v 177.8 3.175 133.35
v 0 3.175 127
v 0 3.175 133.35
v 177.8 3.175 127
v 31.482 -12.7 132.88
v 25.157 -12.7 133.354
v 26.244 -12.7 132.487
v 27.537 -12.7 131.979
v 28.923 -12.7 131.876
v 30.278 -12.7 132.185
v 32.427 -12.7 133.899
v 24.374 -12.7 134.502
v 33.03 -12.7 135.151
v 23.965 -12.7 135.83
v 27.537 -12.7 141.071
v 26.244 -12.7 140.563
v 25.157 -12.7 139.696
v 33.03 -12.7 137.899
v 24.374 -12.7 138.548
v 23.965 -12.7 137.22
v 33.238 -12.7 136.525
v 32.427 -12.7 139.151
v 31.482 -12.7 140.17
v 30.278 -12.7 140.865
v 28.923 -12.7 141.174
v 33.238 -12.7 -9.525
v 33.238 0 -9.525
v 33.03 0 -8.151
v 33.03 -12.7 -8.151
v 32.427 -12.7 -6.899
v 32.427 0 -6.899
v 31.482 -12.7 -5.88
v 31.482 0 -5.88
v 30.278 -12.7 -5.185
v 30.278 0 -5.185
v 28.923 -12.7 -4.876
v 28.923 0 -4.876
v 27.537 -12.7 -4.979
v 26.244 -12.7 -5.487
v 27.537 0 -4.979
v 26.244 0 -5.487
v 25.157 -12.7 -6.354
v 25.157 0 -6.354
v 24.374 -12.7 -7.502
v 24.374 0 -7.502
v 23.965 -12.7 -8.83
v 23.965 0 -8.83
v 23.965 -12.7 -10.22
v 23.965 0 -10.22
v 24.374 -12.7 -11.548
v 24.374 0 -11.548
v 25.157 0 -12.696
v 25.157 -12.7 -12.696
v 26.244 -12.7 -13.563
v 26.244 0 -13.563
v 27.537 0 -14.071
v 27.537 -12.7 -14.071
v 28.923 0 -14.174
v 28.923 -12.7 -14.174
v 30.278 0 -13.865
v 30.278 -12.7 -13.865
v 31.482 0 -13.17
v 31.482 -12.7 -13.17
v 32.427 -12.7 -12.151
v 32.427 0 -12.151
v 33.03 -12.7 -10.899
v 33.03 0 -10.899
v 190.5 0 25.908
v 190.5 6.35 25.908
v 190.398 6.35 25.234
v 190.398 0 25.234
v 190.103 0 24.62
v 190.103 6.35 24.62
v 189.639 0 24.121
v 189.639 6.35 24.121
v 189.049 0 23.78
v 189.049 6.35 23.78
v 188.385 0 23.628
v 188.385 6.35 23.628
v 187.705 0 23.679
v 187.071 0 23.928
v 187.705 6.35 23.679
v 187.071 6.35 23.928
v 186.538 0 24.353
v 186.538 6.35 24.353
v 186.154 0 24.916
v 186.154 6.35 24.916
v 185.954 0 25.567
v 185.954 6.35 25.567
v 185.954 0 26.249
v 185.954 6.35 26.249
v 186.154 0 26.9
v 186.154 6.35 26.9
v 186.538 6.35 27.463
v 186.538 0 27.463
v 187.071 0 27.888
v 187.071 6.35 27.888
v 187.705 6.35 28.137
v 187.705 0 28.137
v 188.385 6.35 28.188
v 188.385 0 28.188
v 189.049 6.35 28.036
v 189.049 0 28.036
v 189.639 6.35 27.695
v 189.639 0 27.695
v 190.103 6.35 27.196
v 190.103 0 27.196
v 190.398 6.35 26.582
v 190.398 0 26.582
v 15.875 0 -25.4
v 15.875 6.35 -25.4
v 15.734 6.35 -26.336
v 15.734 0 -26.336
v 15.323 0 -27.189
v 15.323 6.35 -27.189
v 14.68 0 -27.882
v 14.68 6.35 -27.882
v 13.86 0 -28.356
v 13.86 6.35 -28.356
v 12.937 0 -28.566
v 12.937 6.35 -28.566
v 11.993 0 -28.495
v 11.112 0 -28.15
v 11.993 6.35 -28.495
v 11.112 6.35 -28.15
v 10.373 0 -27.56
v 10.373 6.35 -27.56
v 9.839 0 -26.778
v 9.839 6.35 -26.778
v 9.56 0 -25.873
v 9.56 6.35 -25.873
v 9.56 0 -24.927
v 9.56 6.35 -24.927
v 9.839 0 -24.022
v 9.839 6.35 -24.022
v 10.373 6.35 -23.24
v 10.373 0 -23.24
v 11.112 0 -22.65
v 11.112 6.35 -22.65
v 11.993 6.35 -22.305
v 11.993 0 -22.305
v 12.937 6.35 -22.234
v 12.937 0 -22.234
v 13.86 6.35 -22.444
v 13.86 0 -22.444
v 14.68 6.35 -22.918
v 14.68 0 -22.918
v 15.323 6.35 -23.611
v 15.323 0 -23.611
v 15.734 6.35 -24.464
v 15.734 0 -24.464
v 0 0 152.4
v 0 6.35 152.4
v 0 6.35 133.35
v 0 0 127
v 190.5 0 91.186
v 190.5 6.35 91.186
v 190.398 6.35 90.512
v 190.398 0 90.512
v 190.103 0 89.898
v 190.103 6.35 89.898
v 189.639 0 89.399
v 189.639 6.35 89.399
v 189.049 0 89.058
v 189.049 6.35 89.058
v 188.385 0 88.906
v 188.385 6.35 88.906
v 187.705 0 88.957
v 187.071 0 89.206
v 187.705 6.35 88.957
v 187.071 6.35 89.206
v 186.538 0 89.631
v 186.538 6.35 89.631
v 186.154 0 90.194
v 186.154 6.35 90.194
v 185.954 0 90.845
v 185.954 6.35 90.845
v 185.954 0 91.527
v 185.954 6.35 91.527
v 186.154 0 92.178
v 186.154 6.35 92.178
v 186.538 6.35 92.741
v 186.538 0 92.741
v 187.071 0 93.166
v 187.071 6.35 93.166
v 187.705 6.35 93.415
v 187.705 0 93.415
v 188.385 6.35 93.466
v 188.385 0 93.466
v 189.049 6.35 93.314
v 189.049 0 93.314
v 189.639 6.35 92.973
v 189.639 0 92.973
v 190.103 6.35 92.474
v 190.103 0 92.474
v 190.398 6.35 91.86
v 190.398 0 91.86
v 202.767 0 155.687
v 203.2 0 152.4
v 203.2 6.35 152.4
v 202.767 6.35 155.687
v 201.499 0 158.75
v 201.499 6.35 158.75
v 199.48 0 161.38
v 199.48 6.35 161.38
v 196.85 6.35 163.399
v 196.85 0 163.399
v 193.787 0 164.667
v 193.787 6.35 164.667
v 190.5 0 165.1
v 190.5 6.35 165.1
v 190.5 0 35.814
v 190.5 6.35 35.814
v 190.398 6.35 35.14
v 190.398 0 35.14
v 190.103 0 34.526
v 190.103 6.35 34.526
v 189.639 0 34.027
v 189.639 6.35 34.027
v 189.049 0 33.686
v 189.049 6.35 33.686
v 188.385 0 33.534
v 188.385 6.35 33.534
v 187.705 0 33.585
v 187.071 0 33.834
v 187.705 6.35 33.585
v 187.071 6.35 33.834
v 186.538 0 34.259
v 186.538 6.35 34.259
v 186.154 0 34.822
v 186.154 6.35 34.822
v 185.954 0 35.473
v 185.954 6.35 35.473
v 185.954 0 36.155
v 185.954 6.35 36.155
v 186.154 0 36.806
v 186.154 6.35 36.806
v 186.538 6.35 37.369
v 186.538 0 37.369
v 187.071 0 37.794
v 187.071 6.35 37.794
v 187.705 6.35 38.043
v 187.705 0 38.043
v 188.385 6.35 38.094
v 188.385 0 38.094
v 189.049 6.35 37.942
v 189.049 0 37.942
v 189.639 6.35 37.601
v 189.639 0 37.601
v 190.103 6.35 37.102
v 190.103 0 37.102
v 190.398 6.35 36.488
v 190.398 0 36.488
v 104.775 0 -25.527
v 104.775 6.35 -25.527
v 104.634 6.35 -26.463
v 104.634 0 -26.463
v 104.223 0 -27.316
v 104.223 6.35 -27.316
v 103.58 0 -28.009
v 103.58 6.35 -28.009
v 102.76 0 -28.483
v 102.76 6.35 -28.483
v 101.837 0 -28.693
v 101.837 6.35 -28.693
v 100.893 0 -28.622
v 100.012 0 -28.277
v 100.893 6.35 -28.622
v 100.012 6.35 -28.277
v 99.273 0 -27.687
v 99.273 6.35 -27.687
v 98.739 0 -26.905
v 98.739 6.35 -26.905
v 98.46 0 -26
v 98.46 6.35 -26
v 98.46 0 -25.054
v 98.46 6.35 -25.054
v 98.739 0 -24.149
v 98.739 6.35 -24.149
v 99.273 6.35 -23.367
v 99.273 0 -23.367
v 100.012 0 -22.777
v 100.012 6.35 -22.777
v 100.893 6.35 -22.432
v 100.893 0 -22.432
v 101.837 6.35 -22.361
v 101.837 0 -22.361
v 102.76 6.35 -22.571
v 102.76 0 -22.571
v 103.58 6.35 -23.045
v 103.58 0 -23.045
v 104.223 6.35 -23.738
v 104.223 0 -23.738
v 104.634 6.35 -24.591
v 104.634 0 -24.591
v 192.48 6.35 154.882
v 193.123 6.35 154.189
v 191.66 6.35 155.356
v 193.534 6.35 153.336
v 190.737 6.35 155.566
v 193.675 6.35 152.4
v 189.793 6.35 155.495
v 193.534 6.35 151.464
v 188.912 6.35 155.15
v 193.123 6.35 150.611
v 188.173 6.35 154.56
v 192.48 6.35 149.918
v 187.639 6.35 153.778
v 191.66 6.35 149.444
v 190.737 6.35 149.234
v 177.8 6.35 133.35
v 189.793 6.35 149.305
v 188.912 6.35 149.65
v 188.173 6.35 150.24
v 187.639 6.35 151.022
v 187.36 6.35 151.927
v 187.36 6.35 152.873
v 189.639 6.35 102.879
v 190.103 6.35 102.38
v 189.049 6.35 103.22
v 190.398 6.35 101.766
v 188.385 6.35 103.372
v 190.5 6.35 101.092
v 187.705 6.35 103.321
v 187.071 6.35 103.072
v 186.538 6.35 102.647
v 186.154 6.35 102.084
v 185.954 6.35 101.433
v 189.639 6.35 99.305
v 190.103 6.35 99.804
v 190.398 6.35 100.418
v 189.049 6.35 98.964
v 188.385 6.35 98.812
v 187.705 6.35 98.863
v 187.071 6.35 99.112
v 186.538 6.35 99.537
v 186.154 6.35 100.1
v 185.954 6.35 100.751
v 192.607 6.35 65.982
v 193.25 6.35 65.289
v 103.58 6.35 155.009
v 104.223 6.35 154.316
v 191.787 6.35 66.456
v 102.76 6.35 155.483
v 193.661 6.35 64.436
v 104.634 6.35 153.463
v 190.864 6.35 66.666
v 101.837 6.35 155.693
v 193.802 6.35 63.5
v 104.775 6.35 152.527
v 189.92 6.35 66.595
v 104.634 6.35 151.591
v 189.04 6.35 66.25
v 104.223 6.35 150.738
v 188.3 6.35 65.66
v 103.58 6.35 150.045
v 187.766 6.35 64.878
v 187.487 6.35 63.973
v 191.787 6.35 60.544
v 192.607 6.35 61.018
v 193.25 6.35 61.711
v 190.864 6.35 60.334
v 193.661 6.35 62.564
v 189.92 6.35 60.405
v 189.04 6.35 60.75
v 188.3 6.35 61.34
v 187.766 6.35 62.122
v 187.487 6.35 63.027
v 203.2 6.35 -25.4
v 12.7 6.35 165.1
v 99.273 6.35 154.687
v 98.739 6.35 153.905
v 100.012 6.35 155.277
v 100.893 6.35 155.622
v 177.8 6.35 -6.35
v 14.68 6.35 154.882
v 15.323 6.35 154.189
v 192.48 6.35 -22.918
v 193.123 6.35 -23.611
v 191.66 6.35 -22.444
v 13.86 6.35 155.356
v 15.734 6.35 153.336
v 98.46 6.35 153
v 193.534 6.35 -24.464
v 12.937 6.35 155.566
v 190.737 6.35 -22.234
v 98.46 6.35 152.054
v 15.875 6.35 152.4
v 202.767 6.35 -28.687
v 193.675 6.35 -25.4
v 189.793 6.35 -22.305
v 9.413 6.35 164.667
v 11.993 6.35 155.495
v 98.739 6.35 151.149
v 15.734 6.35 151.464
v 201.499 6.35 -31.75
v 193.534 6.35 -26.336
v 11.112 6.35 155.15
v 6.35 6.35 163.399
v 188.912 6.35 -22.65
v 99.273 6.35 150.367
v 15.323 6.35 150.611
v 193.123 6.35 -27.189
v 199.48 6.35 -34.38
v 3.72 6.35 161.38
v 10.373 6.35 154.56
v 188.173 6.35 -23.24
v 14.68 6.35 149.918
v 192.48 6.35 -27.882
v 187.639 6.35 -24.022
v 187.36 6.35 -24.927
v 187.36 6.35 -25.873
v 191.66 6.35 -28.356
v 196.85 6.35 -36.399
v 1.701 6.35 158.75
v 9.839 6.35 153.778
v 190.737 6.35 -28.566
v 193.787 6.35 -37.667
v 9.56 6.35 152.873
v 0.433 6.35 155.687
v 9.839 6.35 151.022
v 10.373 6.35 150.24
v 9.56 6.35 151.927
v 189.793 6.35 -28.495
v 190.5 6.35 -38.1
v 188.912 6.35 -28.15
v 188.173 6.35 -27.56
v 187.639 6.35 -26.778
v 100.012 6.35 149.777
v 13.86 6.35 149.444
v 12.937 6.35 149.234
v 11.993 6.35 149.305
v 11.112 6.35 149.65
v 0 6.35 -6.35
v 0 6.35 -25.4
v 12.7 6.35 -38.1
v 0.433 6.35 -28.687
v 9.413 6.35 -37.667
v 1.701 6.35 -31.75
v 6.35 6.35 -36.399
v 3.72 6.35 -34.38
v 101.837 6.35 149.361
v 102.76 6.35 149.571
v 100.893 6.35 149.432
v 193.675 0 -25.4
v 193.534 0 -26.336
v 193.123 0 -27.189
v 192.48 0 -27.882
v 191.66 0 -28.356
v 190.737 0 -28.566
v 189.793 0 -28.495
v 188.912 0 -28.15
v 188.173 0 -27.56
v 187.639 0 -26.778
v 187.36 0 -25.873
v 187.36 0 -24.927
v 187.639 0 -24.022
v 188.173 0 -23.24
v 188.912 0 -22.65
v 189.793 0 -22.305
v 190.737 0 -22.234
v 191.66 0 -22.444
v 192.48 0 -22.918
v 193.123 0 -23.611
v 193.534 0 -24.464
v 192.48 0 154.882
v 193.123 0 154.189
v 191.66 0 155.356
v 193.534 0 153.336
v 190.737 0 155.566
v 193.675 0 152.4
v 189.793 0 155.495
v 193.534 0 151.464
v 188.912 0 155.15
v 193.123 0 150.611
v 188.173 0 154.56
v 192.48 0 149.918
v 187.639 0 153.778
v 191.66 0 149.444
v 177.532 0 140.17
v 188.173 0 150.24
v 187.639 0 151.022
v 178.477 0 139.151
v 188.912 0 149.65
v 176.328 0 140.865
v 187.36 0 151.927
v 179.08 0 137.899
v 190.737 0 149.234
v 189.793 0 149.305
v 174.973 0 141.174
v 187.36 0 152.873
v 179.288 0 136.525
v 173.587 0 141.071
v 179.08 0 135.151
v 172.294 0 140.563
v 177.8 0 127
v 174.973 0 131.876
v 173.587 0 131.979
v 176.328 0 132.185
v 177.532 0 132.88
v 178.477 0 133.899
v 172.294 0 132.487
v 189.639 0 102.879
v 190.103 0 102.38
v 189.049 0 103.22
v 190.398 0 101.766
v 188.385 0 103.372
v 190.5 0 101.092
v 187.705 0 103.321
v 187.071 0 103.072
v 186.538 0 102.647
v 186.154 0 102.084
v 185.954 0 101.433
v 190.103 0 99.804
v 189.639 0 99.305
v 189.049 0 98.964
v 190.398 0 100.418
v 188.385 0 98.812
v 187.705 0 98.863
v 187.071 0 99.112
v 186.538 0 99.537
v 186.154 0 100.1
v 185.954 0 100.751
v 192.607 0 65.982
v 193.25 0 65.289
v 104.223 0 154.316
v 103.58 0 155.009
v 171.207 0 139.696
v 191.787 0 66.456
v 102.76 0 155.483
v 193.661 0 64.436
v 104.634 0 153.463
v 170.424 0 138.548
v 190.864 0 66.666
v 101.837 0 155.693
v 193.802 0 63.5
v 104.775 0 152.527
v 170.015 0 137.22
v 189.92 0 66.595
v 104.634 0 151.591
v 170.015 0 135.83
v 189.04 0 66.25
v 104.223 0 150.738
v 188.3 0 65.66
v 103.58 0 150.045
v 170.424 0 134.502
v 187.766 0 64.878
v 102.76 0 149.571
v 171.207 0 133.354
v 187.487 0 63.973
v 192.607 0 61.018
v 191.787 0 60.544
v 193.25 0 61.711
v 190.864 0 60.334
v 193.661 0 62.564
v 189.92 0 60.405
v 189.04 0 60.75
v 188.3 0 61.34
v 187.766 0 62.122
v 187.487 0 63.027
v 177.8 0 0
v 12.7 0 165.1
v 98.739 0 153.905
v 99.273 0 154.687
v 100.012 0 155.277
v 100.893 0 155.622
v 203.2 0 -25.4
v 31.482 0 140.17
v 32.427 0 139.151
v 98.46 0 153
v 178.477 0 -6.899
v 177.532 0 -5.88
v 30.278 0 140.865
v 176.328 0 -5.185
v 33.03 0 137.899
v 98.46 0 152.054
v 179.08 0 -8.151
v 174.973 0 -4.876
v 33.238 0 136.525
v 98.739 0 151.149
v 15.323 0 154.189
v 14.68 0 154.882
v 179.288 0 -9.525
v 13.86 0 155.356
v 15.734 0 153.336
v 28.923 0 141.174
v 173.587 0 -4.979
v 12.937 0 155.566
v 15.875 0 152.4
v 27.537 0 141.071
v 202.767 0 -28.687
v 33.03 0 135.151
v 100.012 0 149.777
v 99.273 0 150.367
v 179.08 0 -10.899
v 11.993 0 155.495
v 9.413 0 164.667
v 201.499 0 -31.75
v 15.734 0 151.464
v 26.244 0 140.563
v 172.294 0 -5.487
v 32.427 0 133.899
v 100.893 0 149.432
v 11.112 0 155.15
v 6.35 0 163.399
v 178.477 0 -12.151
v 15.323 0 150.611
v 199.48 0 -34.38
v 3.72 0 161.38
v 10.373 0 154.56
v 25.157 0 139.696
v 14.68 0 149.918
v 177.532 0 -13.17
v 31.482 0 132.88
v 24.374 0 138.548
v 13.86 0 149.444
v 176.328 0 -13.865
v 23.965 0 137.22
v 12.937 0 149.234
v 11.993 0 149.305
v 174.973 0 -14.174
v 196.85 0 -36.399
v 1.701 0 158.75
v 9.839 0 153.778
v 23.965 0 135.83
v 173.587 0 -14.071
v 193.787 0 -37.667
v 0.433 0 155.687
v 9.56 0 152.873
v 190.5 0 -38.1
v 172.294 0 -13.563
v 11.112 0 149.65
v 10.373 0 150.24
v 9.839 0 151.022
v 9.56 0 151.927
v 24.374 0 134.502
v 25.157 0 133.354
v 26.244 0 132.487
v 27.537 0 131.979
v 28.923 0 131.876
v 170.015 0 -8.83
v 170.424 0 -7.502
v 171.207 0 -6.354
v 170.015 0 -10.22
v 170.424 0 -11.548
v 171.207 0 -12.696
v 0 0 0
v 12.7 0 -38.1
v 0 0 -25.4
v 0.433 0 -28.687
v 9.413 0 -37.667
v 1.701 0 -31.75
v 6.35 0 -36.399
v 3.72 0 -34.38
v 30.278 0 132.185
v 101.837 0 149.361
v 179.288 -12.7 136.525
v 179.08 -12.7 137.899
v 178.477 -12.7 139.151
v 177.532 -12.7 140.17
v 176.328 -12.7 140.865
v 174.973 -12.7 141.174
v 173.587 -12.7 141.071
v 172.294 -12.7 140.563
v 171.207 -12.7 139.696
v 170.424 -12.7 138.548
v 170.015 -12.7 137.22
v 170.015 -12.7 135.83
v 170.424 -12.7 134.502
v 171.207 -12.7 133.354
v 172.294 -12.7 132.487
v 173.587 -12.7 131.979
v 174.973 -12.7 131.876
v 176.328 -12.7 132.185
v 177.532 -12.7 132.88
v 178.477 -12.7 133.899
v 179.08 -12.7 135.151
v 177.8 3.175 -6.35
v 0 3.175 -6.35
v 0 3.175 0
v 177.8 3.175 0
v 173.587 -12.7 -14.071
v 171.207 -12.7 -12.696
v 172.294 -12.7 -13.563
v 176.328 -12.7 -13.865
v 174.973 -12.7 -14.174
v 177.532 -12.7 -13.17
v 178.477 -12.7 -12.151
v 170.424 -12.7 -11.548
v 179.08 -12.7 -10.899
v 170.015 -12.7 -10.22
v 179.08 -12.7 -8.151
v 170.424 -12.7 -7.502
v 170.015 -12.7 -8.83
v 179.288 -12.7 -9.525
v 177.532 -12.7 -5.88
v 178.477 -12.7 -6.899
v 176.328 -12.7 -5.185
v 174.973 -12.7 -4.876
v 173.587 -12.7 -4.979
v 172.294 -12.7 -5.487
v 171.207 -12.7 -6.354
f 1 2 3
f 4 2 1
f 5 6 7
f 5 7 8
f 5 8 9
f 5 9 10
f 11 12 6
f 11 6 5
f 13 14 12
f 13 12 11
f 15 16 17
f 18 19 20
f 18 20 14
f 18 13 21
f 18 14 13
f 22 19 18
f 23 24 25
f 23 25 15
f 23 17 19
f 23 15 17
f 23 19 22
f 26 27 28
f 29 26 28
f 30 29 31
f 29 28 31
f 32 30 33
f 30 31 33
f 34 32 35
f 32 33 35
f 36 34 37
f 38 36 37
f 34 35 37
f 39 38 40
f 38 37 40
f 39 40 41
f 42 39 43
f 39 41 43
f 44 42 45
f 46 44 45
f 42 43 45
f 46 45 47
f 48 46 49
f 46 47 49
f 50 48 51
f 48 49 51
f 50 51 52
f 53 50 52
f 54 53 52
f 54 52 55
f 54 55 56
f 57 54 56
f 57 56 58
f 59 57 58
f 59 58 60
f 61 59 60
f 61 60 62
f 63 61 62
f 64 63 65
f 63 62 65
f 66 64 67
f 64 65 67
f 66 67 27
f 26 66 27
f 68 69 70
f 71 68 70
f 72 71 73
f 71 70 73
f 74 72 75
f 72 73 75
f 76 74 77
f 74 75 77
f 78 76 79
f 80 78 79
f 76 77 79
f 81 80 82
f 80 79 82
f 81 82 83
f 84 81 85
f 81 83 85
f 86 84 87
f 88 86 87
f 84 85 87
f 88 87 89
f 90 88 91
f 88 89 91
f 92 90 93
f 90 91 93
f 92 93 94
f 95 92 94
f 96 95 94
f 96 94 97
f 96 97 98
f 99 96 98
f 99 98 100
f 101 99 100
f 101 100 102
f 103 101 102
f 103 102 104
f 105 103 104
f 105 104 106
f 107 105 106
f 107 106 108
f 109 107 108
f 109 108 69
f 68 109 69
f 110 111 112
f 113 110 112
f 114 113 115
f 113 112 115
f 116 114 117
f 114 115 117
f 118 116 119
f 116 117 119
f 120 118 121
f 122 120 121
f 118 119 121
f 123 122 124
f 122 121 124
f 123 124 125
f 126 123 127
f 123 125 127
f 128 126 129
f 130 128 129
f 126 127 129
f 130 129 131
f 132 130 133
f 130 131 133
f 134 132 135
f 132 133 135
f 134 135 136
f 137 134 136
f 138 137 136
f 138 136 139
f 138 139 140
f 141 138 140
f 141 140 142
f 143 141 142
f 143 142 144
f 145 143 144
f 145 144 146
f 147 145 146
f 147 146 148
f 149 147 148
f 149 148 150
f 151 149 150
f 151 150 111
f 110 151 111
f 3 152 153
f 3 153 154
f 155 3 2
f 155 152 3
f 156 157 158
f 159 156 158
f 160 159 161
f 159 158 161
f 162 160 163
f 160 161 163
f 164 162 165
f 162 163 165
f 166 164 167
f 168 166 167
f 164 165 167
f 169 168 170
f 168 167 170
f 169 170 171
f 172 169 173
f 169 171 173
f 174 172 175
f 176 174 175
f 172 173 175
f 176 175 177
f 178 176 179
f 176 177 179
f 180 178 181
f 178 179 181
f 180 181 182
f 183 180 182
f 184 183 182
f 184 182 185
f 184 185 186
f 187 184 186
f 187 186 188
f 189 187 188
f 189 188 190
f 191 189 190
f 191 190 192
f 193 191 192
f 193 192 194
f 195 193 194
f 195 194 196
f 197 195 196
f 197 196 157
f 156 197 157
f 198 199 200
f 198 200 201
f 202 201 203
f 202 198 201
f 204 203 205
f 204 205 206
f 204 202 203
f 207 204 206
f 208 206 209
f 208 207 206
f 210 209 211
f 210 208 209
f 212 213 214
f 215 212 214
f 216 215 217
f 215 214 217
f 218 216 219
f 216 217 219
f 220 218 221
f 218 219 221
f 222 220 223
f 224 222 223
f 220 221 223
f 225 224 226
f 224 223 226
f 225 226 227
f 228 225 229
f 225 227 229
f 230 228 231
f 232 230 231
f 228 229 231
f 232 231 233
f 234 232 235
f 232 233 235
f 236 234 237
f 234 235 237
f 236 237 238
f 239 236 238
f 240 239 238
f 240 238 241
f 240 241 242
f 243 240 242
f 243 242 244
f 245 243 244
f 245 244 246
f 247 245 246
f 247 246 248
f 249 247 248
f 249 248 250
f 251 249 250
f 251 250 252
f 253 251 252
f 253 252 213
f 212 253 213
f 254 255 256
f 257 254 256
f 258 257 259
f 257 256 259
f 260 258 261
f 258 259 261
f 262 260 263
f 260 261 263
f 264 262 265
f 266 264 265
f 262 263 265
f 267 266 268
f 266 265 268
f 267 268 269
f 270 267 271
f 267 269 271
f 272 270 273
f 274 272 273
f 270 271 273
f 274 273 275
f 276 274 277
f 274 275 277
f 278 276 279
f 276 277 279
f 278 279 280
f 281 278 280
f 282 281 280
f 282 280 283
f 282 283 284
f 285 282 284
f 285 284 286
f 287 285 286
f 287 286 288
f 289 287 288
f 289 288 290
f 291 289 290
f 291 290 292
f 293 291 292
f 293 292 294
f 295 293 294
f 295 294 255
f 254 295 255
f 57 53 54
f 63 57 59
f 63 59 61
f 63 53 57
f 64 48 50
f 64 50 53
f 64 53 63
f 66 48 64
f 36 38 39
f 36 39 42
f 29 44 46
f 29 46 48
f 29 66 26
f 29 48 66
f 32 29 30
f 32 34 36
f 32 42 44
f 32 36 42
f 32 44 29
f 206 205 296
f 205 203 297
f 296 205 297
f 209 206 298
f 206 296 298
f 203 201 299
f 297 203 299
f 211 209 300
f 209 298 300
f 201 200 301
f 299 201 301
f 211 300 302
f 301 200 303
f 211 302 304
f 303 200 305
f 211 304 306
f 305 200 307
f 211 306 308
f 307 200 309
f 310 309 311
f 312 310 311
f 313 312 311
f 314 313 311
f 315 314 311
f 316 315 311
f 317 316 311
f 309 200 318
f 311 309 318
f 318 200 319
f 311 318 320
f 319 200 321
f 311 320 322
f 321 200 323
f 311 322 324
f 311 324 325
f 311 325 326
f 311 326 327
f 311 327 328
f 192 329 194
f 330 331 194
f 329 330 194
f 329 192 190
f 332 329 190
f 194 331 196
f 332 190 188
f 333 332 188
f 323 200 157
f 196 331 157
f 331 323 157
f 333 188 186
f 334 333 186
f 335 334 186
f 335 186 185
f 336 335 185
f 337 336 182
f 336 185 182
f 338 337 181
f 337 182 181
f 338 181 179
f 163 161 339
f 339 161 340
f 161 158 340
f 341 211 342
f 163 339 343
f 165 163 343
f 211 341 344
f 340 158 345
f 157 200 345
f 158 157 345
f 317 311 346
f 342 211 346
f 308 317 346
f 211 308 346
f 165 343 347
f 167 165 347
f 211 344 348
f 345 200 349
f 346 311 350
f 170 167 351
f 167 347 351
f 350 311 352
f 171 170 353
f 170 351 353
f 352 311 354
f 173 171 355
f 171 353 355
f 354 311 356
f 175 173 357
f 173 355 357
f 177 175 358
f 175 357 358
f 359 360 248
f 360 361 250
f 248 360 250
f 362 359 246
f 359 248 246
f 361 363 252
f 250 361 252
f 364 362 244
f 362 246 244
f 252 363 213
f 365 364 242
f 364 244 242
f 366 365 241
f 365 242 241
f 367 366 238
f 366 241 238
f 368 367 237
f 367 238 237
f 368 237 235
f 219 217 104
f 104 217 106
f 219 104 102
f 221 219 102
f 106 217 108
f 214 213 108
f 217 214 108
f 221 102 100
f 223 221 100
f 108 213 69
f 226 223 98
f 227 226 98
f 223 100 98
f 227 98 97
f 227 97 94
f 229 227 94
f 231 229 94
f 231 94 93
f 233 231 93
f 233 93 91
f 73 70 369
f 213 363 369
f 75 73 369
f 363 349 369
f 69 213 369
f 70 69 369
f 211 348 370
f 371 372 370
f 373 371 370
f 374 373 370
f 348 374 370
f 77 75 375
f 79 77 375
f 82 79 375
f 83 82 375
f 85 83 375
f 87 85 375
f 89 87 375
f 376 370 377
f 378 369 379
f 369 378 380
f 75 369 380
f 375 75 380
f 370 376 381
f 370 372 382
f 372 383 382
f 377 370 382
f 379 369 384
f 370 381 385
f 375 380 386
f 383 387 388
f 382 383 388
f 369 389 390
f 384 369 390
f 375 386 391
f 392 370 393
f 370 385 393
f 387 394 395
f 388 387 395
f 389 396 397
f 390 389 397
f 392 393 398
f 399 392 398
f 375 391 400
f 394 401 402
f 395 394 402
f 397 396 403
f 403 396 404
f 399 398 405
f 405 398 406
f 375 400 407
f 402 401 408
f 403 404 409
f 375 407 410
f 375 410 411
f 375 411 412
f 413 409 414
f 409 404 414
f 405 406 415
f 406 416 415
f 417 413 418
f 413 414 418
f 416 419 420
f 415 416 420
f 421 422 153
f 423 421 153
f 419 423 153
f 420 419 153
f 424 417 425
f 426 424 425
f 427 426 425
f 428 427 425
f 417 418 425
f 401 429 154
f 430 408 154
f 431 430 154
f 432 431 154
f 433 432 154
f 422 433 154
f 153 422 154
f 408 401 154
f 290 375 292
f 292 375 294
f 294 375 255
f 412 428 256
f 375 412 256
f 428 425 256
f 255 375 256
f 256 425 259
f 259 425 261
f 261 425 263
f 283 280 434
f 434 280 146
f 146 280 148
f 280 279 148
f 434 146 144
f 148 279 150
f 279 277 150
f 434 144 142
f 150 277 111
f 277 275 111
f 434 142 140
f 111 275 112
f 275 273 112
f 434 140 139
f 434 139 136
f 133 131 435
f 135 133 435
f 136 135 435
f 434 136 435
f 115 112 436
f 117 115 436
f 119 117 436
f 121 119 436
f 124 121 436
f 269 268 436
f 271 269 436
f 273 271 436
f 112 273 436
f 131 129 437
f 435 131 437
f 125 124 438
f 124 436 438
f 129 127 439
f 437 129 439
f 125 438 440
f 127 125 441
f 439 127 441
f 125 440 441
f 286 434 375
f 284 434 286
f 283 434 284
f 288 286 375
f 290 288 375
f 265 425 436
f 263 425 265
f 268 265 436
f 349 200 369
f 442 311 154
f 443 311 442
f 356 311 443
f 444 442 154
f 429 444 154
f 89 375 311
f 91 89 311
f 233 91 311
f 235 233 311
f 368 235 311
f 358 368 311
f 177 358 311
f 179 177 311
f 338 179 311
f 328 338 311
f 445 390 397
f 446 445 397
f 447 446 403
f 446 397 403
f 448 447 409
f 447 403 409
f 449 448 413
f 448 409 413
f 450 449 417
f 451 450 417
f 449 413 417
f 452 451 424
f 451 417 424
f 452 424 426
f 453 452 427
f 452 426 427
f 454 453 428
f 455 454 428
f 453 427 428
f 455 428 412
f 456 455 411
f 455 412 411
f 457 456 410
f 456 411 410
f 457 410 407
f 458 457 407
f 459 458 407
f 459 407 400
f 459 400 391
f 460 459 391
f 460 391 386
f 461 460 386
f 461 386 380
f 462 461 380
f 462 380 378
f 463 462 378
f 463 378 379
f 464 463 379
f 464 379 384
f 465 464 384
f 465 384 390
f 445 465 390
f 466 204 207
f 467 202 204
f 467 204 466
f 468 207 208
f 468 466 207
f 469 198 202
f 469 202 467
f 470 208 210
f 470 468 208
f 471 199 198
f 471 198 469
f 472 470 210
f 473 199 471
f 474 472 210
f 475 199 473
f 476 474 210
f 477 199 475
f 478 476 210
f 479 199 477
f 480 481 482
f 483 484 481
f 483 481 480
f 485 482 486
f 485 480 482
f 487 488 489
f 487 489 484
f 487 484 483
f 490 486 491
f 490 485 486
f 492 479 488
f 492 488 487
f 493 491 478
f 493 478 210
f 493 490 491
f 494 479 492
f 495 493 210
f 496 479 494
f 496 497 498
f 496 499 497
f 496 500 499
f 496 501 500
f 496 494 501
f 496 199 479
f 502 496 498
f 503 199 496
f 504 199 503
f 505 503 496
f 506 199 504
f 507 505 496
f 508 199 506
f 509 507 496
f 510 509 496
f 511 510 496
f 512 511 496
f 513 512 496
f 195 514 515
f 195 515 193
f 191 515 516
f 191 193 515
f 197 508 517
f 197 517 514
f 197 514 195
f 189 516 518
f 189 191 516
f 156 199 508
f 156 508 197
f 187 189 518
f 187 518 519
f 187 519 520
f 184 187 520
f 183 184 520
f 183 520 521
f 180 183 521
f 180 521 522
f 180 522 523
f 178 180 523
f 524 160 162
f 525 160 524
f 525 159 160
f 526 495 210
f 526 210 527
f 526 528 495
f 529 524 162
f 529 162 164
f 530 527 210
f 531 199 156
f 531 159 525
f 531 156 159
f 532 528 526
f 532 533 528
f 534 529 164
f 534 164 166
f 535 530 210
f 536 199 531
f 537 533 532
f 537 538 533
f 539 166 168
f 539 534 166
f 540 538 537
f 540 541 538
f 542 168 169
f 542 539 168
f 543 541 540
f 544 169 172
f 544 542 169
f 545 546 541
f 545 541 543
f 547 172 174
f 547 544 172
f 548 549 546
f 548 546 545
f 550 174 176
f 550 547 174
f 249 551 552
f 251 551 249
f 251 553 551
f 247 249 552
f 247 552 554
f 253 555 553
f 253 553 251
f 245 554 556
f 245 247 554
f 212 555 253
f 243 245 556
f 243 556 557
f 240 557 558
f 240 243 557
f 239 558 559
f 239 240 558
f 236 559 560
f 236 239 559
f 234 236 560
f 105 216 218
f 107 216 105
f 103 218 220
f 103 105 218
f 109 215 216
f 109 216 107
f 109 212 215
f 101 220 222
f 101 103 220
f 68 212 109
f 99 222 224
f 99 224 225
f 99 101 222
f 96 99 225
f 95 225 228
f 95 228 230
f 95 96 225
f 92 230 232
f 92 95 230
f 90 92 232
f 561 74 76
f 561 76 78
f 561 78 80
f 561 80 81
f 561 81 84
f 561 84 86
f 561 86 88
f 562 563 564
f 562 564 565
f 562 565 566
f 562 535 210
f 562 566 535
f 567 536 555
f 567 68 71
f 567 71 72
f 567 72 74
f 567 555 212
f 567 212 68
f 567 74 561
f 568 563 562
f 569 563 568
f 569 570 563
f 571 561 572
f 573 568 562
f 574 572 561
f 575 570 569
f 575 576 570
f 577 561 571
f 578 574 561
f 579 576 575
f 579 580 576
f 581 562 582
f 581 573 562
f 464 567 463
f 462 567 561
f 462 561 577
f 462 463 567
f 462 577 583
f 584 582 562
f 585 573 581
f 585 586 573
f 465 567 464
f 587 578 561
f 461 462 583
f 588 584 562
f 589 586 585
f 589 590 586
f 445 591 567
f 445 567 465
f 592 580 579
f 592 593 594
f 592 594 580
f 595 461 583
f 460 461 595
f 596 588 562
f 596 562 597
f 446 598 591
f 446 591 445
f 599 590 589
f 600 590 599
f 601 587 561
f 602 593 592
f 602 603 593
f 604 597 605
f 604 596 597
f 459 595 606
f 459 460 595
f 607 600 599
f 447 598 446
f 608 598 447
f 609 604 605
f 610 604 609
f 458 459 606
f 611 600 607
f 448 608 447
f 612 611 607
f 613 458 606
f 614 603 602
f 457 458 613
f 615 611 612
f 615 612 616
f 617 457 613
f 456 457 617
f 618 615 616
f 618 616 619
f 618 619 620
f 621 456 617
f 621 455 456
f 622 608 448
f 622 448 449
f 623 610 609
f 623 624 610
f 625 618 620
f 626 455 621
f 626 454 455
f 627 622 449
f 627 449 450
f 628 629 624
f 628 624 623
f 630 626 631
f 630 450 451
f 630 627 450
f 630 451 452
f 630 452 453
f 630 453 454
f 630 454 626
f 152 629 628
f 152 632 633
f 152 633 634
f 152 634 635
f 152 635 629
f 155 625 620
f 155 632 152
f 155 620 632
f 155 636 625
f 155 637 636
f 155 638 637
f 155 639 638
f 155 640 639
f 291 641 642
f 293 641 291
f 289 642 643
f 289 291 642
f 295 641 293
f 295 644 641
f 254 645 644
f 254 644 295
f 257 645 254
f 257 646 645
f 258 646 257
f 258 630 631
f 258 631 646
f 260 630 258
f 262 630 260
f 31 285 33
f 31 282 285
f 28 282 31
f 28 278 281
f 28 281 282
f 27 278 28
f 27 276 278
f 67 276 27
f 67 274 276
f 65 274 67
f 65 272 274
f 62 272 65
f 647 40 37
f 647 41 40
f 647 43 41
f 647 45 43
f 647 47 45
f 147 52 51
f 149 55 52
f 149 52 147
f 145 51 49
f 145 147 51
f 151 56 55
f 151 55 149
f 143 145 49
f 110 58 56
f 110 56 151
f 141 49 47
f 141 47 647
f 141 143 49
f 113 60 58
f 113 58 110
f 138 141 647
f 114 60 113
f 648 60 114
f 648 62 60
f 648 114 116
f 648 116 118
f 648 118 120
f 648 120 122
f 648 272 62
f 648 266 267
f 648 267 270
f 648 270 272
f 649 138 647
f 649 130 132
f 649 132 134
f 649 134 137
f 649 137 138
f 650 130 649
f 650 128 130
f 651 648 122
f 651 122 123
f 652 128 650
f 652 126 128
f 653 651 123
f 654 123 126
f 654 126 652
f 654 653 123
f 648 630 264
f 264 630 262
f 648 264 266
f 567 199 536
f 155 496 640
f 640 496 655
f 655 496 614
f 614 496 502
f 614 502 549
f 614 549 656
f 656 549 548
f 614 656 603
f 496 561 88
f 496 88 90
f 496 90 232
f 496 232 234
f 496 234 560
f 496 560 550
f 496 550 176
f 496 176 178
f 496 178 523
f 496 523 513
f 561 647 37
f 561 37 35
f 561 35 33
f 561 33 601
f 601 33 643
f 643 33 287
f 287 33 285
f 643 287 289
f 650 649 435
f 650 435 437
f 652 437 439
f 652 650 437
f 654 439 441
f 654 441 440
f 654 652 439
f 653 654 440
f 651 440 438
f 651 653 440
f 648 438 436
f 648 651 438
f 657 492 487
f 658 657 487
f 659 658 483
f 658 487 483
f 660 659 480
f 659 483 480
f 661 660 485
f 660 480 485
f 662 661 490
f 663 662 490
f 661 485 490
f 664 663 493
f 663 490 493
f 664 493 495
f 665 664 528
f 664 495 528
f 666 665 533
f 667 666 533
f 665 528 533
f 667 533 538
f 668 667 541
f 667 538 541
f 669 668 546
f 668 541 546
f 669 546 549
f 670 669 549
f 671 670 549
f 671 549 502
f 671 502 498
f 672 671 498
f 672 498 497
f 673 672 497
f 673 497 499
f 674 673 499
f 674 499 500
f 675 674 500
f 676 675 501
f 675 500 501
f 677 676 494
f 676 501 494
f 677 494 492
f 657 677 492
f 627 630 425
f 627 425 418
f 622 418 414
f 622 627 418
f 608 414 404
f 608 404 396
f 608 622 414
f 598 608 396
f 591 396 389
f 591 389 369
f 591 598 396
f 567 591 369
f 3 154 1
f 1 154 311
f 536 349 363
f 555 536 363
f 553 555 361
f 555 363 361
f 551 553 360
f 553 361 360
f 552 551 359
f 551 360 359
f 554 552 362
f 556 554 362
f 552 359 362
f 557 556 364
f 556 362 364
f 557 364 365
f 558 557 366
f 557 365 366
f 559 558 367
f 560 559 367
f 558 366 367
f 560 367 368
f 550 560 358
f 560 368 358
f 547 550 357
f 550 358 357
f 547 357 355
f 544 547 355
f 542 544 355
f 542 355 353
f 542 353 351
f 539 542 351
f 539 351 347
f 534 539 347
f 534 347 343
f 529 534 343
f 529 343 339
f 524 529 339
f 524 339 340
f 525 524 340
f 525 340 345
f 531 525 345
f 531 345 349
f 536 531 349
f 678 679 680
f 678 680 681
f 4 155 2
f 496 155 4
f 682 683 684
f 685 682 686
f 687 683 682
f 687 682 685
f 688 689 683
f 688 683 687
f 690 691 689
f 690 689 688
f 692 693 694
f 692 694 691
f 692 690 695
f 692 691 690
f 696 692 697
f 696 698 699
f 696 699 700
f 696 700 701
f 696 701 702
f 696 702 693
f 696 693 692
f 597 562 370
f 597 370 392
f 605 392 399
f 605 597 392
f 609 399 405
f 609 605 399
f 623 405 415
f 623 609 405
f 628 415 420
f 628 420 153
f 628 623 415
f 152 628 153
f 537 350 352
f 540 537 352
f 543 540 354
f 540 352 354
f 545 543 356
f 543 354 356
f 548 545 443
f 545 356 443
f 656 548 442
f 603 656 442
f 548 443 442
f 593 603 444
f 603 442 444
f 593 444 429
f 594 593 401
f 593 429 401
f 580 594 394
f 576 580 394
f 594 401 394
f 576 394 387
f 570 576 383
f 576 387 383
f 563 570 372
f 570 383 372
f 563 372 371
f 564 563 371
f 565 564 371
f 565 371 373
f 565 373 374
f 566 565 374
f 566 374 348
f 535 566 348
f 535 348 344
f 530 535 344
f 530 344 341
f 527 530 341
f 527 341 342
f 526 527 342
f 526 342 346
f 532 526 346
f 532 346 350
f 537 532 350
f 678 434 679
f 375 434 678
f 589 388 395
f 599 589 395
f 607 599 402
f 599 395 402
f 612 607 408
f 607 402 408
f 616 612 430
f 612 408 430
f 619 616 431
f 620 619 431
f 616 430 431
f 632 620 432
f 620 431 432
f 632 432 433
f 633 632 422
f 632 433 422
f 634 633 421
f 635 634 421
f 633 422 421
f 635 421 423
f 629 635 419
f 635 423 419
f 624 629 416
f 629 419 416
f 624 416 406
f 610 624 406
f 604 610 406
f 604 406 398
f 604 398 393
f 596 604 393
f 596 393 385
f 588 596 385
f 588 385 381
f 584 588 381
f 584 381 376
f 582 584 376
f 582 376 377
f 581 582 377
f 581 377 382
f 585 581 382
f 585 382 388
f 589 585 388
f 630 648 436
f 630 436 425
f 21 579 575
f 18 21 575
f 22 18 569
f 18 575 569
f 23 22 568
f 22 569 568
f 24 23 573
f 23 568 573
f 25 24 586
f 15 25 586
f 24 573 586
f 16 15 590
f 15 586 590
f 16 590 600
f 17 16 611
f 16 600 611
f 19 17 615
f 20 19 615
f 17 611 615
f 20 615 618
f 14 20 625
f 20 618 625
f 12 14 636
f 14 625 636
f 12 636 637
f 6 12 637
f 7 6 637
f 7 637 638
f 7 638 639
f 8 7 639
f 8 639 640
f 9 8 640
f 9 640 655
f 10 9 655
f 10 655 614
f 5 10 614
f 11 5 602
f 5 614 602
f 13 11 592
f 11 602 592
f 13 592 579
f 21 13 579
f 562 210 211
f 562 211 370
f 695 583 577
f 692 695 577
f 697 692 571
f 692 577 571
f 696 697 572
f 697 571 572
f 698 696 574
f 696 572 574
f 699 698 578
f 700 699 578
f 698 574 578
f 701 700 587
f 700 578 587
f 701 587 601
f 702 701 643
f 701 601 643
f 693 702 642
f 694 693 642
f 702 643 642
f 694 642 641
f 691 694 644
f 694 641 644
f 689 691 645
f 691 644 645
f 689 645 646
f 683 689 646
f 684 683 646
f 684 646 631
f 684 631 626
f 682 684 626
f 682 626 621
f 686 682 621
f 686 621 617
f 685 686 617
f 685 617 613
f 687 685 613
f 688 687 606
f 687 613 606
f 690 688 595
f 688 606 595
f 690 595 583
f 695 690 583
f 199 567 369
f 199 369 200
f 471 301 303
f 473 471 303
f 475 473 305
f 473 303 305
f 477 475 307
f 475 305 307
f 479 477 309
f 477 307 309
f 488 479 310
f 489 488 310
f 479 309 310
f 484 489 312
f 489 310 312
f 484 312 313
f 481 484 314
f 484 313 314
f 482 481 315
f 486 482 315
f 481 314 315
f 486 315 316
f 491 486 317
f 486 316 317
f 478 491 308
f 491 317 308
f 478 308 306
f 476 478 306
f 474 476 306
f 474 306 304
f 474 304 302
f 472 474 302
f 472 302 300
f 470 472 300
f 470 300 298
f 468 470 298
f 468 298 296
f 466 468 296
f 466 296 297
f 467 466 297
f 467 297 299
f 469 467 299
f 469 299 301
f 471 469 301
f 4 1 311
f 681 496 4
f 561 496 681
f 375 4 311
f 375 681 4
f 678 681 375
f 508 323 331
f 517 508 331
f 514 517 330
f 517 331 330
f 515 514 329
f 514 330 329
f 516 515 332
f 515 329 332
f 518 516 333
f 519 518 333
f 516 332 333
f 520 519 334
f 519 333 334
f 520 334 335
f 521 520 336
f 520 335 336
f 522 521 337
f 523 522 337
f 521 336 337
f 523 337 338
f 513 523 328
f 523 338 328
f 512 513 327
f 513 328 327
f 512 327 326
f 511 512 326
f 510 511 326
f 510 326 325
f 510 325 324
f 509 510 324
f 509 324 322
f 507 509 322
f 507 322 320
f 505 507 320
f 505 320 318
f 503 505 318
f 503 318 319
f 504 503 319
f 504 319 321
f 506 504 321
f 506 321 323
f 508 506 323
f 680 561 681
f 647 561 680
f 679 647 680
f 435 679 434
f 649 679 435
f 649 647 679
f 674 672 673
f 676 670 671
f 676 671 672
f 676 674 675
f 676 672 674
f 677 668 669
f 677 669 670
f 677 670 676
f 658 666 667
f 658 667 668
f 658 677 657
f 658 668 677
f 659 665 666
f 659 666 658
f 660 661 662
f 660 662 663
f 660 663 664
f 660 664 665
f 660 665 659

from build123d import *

# Parameters (mm, degrees)
BOSS_EXTRUDE2_DEPTH = 6.35
SKETCH2_R           = 3.175
CUT_EXTRUDE1_DEPTH  = 7.35
SKETCH5_R           = 4.6625
BOSS_EXTRUDE3_DEPTH = 12.7
SKETCH6_W           = 177.8
SKETCH6_H           = 6.35
CUT_EXTRUDE2_DEPTH  = 3.175
SKETCH7_R           = 2.286
CUT_EXTRUDE3_DEPTH  = 12.7
SKETCH8_R           = 3.175
CUT_EXTRUDE4_DEPTH  = 20.05


with BuildPart() as part:
    # Sketch1 → Boss-Extrude2 (new body)
    with BuildSketch(Plane(origin=(0, 0, 0), x_dir=(1, 0, 0), z_dir=(0, 1, 0))):
        with BuildLine():
            Line((0, 0), (0, 25.4))
            ThreePointArc((0, 25.4), (3.719743879, 34.380256121), (12.7, 38.1))
            Line((12.7, 38.1), (190.5, 38.1))
            ThreePointArc((190.5, 38.1), (199.480256121, 34.380256121), (203.2, 25.4))
            Line((203.2, 25.4), (203.2, -152.4))
            ThreePointArc((203.2, -152.4), (199.480256121, -161.380256121), (190.5, -165.1))
            Line((190.5, -165.1), (12.7, -165.1))
            ThreePointArc((12.7, -165.1), (3.719743879, -161.380256121), (0, -152.4))
            Line((0, -152.4), (0, -127))
            Line((0, -127), (177.8, -127))
            Line((177.8, -127), (177.8, 0))
            Line((177.8, 0), (0, 0))
        make_face()
    extrude(amount=BOSS_EXTRUDE2_DEPTH)

    # Sketch2 → Cut-Extrude1 (cut, through all)
    with BuildSketch(Plane(origin=(0, 6.35, 0), x_dir=(1, 0, 0), z_dir=(0, 1, 0))):
        with Locations((12.7, 25.4)):
            Circle(SKETCH2_R)
        with Locations((190.5, 25.4)):
            Circle(SKETCH2_R)
        with Locations((190.5, -152.4)):
            Circle(SKETCH2_R)
        with Locations((12.7, -152.4)):
            Circle(SKETCH2_R)
    extrude(amount=-CUT_EXTRUDE1_DEPTH, mode=Mode.SUBTRACT)

    # Sketch5 → Boss-Extrude3 (add)
    with BuildSketch(Plane.XZ):
        with Locations((28.575, 136.525)):
            Circle(SKETCH5_R)
        with Locations((174.625, 136.525)):
            Circle(SKETCH5_R)
        with Locations((174.625, -9.525)):
            Circle(SKETCH5_R)
        with Locations((28.575, -9.525)):
            Circle(SKETCH5_R)
    extrude(amount=BOSS_EXTRUDE3_DEPTH)

    # Sketch6 → Cut-Extrude2 (cut)
    with BuildSketch(Plane(origin=(0, 6.35, 0), x_dir=(1, 0, 0), z_dir=(0, 1, 0))):
        with Locations((88.9, -130.175)):
            Rectangle(SKETCH6_W, SKETCH6_H)
        with Locations((88.9, 3.175)):
            Rectangle(SKETCH6_W, SKETCH6_H)
    extrude(amount=-CUT_EXTRUDE2_DEPTH, mode=Mode.SUBTRACT)

    # Sketch7 → Cut-Extrude3 (cut)
    with BuildSketch(Plane(origin=(0, 6.35, 0), x_dir=(1, 0, 0), z_dir=(0, 1, 0))):
        with Locations((188.214, -101.092)):
            Circle(SKETCH7_R)
        with Locations((188.214, -91.186)):
            Circle(SKETCH7_R)
        with Locations((188.214, -35.814)):
            Circle(SKETCH7_R)
        with Locations((188.214, -25.908)):
            Circle(SKETCH7_R)
    extrude(amount=-CUT_EXTRUDE3_DEPTH, mode=Mode.SUBTRACT)

    # Sketch8 → Cut-Extrude4 (cut, through all)
    with BuildSketch(Plane(origin=(0, 6.35, 0), x_dir=(1, 0, 0), z_dir=(0, 1, 0))):
        with Locations((101.6, 25.527)):
            Circle(SKETCH8_R)
        with Locations((190.627, -63.5)):
            Circle(SKETCH8_R)
        with Locations((101.6, -152.527)):
            Circle(SKETCH8_R)
    extrude(amount=-CUT_EXTRUDE4_DEPTH, mode=Mode.SUBTRACT)


solid = part.part
